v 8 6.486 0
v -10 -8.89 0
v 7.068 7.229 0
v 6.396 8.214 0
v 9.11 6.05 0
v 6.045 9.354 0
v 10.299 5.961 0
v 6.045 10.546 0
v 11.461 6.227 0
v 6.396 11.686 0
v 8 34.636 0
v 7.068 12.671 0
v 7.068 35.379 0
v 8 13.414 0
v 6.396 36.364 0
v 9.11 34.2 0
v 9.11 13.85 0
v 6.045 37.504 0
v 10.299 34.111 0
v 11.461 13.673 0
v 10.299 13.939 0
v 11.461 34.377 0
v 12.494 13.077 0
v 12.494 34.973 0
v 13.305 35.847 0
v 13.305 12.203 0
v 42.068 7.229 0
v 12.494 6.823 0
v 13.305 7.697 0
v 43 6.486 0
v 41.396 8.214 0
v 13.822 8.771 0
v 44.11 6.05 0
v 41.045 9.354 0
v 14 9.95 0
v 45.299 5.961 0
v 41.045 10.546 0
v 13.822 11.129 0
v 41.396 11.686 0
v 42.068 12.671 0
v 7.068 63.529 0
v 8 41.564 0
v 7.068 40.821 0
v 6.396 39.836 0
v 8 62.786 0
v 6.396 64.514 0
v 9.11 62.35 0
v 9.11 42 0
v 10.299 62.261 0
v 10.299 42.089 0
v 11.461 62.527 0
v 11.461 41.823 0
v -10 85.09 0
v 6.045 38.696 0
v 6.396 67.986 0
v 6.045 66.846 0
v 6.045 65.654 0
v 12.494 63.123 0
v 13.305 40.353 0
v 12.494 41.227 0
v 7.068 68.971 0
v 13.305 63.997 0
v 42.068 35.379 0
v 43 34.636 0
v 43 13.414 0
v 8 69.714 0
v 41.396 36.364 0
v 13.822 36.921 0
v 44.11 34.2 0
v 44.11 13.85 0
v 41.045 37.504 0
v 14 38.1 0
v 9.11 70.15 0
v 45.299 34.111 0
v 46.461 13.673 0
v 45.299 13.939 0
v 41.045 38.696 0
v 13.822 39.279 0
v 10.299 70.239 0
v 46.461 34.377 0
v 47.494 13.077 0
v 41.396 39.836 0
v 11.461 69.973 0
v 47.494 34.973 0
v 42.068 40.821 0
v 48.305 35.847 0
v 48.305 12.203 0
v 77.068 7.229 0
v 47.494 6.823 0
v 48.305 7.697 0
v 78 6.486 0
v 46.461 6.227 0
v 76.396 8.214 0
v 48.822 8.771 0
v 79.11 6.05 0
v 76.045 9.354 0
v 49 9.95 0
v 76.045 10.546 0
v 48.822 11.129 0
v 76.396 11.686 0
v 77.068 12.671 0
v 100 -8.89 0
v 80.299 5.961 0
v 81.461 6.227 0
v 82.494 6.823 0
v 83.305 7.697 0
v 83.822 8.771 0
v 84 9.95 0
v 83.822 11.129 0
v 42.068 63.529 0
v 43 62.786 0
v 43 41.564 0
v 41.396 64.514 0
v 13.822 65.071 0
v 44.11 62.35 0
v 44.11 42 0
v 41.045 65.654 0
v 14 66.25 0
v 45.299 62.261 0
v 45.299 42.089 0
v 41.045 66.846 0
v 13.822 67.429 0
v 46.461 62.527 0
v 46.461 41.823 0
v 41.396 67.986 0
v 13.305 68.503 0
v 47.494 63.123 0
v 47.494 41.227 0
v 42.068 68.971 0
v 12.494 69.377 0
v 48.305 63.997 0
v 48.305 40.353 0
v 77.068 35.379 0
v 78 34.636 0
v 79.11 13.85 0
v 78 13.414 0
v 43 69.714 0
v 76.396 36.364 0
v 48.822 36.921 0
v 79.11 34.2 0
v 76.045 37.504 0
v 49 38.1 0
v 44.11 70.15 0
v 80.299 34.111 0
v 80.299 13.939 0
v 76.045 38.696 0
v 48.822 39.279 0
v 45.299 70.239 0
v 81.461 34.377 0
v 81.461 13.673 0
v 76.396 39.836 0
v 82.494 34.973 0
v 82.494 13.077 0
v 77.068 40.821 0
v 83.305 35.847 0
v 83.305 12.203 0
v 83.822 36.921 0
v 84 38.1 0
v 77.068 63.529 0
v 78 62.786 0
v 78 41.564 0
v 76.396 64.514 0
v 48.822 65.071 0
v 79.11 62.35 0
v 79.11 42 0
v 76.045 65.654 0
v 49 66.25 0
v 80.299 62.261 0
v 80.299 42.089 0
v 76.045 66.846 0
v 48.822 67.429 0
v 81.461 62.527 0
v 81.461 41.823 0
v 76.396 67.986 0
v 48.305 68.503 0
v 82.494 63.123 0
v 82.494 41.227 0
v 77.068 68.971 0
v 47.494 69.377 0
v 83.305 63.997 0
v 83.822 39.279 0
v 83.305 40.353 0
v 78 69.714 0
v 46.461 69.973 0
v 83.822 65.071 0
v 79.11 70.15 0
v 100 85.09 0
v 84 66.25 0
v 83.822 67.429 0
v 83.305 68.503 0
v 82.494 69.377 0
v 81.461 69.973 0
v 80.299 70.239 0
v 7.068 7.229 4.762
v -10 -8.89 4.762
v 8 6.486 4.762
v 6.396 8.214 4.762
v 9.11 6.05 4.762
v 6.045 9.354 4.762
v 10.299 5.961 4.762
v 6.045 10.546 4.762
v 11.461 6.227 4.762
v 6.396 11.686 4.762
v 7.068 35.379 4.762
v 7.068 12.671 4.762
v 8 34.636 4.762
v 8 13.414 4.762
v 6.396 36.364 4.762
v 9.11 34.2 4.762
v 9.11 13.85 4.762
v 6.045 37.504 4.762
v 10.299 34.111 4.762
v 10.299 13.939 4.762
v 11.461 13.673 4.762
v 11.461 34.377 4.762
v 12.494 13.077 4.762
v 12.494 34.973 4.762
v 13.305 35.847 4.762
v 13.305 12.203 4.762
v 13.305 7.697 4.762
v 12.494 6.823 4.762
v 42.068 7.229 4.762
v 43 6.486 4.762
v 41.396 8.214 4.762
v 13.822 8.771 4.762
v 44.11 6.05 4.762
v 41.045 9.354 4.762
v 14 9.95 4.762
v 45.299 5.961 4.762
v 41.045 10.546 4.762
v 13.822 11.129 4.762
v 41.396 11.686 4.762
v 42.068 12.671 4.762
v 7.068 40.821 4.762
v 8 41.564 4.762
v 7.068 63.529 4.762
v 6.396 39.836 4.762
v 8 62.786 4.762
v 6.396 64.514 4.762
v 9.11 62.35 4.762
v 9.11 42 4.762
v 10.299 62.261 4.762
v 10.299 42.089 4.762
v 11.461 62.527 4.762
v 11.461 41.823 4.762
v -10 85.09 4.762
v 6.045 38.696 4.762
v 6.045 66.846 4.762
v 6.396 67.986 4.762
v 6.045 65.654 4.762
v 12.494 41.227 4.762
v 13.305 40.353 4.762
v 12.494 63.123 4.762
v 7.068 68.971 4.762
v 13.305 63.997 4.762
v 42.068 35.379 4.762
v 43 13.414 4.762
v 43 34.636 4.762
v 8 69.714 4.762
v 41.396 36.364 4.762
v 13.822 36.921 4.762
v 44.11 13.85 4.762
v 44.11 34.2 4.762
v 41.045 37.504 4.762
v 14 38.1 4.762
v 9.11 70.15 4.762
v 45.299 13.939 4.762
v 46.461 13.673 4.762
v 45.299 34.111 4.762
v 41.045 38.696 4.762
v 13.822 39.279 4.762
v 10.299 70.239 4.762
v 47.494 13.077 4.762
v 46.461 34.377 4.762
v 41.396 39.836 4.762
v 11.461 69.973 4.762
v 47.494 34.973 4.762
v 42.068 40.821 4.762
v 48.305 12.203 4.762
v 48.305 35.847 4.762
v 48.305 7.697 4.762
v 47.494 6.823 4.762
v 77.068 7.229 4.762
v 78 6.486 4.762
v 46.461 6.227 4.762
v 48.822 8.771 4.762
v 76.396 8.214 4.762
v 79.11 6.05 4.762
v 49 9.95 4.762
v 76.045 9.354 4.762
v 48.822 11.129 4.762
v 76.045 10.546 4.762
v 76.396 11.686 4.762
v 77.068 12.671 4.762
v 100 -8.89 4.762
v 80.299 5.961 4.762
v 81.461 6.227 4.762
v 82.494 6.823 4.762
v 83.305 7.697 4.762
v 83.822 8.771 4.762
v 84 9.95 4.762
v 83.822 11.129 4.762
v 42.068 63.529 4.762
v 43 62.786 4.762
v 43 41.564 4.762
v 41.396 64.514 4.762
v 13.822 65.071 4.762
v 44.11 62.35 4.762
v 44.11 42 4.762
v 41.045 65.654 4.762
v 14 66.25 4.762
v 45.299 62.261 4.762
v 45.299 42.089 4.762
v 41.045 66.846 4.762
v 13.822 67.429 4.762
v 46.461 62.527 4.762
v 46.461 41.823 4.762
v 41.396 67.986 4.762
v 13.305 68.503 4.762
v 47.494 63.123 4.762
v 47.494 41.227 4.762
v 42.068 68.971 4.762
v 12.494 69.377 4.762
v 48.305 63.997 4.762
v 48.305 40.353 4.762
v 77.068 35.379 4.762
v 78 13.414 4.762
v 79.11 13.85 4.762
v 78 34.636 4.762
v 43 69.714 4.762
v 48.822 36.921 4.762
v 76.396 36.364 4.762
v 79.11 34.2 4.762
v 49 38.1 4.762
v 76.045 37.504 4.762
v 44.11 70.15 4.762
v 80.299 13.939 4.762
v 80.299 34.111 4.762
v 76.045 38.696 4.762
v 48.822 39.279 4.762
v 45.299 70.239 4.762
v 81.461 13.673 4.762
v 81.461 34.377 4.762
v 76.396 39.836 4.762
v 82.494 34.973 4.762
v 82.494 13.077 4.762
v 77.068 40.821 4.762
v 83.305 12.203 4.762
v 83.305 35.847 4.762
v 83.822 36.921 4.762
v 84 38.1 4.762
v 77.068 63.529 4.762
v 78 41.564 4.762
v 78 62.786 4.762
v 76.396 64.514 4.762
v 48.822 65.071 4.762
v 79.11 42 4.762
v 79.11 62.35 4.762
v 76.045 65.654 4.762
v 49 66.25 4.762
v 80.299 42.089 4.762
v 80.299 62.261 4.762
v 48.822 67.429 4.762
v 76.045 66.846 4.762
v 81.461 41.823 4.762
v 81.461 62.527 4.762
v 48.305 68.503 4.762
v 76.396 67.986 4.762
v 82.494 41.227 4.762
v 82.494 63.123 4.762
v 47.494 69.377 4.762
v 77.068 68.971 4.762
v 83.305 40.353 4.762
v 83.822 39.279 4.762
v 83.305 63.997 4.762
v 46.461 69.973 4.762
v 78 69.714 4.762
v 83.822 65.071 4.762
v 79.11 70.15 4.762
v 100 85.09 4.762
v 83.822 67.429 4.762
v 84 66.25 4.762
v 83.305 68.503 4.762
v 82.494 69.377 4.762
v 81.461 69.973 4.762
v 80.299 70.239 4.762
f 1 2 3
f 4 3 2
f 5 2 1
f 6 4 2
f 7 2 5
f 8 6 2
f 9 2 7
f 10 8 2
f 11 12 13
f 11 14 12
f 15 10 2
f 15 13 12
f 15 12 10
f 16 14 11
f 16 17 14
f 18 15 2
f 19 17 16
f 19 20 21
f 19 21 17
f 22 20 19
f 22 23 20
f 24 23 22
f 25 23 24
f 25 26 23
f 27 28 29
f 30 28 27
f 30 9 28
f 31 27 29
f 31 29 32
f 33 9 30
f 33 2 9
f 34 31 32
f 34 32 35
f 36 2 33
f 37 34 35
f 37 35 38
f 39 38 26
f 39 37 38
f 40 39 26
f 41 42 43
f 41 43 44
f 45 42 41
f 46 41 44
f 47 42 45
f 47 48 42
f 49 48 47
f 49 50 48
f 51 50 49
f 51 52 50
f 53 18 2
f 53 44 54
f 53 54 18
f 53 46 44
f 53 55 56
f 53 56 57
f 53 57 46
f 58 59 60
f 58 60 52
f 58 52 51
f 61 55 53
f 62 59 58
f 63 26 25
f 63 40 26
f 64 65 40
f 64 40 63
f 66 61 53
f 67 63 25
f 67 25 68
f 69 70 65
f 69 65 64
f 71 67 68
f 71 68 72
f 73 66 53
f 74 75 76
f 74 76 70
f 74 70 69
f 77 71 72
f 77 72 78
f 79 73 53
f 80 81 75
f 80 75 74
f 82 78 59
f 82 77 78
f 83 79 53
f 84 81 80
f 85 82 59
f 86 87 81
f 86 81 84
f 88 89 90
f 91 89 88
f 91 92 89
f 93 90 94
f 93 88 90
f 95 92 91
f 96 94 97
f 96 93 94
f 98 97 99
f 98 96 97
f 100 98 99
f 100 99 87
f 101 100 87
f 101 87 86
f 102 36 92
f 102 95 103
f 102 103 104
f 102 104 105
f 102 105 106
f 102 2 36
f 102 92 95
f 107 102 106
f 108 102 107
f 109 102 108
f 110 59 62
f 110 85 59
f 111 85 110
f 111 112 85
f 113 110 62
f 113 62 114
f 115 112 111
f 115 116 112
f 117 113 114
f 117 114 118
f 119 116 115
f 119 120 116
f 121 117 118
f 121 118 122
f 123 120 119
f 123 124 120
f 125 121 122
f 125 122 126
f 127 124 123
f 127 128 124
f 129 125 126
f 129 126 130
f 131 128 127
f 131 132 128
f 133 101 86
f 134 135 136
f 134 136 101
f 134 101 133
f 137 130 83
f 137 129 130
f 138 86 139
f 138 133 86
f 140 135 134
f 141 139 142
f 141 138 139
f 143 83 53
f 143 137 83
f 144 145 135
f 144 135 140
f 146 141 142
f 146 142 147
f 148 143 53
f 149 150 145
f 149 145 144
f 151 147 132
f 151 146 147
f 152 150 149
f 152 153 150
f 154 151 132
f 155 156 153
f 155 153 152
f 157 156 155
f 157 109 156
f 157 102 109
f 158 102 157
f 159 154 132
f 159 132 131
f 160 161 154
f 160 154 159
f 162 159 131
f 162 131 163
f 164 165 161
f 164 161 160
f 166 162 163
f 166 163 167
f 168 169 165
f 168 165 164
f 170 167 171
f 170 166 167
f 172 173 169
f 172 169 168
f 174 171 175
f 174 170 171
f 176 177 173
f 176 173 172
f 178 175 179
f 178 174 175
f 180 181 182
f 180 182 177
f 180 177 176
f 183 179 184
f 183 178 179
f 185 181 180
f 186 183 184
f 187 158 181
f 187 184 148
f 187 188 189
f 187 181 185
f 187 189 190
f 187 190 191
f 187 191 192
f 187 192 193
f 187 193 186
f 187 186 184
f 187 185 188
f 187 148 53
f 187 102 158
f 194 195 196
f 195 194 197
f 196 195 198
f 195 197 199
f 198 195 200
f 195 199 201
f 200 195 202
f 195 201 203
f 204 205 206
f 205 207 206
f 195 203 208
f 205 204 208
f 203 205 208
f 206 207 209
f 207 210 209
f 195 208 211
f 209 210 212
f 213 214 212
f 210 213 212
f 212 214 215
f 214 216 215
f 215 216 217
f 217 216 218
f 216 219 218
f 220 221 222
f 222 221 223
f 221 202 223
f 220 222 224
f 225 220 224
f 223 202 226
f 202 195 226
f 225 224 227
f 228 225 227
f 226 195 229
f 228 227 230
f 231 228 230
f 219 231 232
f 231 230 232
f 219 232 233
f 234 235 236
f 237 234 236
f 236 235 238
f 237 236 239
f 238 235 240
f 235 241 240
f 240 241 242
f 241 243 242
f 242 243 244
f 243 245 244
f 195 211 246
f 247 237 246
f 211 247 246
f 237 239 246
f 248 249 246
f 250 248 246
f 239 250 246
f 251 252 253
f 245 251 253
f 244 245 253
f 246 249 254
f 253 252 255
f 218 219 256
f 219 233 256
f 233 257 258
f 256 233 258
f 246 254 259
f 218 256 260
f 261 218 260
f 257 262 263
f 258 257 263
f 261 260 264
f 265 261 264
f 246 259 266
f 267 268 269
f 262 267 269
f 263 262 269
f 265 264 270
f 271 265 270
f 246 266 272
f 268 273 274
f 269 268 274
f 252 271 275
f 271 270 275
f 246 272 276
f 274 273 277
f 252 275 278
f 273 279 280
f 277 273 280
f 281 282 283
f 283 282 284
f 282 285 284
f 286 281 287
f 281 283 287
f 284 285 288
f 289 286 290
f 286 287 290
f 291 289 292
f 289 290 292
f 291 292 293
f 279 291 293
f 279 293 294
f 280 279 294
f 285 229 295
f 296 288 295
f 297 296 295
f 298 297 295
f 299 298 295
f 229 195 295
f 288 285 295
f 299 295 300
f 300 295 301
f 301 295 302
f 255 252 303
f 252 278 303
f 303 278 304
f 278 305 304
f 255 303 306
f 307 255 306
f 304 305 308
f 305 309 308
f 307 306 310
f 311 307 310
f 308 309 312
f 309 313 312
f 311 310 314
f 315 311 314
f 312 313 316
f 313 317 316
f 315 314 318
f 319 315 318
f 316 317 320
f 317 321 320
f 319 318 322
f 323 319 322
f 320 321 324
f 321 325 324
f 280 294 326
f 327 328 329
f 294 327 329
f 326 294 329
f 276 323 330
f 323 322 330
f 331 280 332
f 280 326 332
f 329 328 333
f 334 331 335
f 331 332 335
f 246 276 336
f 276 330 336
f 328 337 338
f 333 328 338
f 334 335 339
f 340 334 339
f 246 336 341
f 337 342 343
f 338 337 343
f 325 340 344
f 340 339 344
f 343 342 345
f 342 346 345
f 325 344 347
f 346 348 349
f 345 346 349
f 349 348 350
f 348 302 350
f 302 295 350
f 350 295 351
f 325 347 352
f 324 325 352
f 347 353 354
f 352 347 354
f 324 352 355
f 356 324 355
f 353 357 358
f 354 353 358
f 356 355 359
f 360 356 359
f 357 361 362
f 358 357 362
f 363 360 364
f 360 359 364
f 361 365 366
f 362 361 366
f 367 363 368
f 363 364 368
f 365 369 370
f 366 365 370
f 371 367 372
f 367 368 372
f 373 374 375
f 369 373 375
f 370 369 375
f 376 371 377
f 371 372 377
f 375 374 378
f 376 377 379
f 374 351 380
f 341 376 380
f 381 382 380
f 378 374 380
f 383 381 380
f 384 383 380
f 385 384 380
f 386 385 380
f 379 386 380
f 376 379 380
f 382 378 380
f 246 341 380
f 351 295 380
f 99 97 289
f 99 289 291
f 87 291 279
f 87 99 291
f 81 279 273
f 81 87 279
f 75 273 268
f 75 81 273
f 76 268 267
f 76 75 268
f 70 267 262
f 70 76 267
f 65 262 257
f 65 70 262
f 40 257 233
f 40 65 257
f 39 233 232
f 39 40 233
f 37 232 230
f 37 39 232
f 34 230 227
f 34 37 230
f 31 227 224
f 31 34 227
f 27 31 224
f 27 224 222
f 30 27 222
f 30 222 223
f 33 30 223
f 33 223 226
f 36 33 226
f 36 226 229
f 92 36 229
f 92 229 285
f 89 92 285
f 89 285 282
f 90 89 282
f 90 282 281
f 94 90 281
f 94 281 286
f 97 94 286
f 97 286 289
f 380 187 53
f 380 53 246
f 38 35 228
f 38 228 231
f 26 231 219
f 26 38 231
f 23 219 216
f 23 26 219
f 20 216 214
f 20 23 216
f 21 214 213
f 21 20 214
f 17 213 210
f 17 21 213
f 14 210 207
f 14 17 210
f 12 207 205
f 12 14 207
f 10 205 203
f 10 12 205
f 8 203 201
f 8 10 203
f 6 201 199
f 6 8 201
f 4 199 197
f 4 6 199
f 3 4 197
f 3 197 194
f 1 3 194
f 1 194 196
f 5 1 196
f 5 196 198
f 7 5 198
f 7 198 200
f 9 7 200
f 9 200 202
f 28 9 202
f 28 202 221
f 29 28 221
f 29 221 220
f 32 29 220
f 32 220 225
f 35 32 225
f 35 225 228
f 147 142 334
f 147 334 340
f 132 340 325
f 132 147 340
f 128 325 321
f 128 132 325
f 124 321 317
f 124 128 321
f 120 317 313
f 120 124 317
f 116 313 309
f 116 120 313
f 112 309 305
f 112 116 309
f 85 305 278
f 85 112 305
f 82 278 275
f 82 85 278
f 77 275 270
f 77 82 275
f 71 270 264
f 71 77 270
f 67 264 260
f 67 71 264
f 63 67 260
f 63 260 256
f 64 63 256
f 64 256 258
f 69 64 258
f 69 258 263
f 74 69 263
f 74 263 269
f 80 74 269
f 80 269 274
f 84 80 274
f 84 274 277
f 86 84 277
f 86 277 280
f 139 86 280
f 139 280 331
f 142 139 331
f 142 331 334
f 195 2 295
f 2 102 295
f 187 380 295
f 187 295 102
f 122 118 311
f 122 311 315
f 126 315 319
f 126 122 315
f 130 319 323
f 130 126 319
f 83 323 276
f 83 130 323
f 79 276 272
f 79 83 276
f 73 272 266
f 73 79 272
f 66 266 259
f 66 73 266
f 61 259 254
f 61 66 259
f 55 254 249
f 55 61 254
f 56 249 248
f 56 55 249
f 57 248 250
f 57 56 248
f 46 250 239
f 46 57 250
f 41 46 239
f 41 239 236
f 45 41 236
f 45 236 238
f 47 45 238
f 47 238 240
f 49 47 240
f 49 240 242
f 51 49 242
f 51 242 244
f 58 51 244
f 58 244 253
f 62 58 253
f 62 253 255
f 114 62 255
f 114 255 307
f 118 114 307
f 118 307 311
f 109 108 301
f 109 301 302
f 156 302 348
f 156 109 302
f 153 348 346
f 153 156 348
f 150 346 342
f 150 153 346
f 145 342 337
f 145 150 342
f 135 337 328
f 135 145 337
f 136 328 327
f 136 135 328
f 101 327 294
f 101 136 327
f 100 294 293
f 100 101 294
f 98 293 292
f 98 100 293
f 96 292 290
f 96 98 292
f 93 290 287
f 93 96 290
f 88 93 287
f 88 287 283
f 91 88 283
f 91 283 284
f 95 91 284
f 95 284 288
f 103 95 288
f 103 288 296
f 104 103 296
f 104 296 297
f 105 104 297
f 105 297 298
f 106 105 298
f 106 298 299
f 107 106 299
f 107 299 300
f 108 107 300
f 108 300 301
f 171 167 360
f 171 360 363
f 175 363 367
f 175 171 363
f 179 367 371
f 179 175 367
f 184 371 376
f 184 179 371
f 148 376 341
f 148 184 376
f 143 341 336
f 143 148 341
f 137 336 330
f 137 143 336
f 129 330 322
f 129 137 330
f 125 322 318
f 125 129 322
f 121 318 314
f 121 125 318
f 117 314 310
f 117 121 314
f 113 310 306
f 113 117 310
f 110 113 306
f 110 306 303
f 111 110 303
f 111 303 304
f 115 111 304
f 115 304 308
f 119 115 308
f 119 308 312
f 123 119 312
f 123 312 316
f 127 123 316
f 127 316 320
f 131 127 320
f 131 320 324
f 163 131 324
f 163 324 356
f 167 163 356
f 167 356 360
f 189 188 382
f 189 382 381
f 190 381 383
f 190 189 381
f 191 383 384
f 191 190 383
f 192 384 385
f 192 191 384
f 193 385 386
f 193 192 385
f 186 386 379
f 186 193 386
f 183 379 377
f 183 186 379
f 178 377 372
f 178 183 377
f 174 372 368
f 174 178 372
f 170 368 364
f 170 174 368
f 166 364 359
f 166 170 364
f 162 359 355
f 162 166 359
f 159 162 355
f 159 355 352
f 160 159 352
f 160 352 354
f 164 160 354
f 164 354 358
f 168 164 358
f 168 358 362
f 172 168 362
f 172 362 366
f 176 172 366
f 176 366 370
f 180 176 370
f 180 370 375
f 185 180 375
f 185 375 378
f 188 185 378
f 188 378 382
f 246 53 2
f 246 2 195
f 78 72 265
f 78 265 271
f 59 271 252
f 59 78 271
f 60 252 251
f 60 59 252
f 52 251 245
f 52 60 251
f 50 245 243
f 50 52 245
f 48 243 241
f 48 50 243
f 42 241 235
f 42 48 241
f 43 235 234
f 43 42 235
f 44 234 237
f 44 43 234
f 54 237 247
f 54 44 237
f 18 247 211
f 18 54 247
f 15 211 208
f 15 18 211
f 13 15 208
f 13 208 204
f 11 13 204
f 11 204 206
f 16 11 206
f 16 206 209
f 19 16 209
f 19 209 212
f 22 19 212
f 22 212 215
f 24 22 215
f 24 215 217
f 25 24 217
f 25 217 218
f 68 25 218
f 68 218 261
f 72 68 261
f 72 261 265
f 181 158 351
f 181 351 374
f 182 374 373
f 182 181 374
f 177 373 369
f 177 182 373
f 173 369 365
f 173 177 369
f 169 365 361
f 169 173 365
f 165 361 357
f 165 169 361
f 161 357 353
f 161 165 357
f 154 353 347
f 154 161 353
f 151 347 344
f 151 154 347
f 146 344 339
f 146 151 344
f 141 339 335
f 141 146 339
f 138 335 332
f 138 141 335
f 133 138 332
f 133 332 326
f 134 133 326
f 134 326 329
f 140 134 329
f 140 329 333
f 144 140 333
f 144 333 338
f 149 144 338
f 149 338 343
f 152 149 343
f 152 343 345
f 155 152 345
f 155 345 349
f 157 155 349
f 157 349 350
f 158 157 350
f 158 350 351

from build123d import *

# Parameters (mm, degrees)
CROQUIS1_W               = 90
CROQUIS1_H               = 76.2
CROQUIS1_R               = 4
SALIENTE_EXTRUIR1_DEPTH  = 0.47625
CROQUIS1_2_W             = 90
CROQUIS1_2_H             = 76.2
CROQUIS1_2_R             = 4
SALIENTE_EXTRUIR2_DEPTH  = 4.7625
CROQUIS3_W               = 90
CROQUIS3_H               = 4.7625
SALIENTE_EXTRUIR3_DEPTH  = 4.445
CROQUIS5_W               = 90
CROQUIS5_H               = 4.7625
SALIENTE_EXTRUIR4_DEPTH  = 4.445
CROQUIS6_W               = 4.7625
CROQUIS6_H               = 85.09
SALIENTE_EXTRUIR5_DEPTH  = 5
CROQUIS7_W               = 4.7625
CROQUIS7_H               = 85.09
SALIENTE_EXTRUIR6_DEPTH  = 5
CROQUIS8_W               = 100
CROQUIS8_H               = 4.7625
SALIENTE_EXTRUIR7_DEPTH  = 4.445
CROQUIS9_W               = 100
CROQUIS9_H               = 4.7625
SALIENTE_EXTRUIR8_DEPTH  = 4.445
CROQUIS10_W              = 4.7625
CROQUIS10_H              = 93.98
SALIENTE_EXTRUIR9_DEPTH  = 5
CROQUIS12_W              = 4.7625
CROQUIS12_H              = 93.98
SALIENTE_EXTRUIR10_DEPTH = 5


with BuildPart() as part:
    # Croquis1 → Saliente-Extruir1 (new body)
    with BuildSketch(Plane.XY):
        with Locations((45, 38.1)):
            Rectangle(CROQUIS1_W, CROQUIS1_H)
        with Locations((45, 38.1)):
            Circle(CROQUIS1_R, mode=Mode.SUBTRACT)
        with Locations((10, 9.95)):
            Circle(CROQUIS1_R, mode=Mode.SUBTRACT)
        with Locations((10, 66.25)):
            Circle(CROQUIS1_R, mode=Mode.SUBTRACT)
        with Locations((80, 66.25)):
            Circle(CROQUIS1_R, mode=Mode.SUBTRACT)
        with Locations((80, 9.95)):
            Circle(CROQUIS1_R, mode=Mode.SUBTRACT)
        with Locations((45, 66.25)):
            Circle(CROQUIS1_R, mode=Mode.SUBTRACT)
        with Locations((10, 38.1)):
            Circle(CROQUIS1_R, mode=Mode.SUBTRACT)
        with Locations((80, 38.1)):
            Circle(CROQUIS1_R, mode=Mode.SUBTRACT)
        with Locations((45, 9.95)):
            Circle(CROQUIS1_R, mode=Mode.SUBTRACT)
    extrude(amount=SALIENTE_EXTRUIR1_DEPTH)

    # Croquis1<2> → Saliente-Extruir2 (add)
    with BuildSketch(Plane.XY):
        with Locations((45, 38.1)):
            Rectangle(CROQUIS1_2_W, CROQUIS1_2_H)
        with Locations((45, 38.1)):
            Circle(CROQUIS1_2_R, mode=Mode.SUBTRACT)
        with Locations((10, 9.95)):
            Circle(CROQUIS1_2_R, mode=Mode.SUBTRACT)
        with Locations((10, 66.25)):
            Circle(CROQUIS1_2_R, mode=Mode.SUBTRACT)
        with Locations((80, 66.25)):
            Circle(CROQUIS1_2_R, mode=Mode.SUBTRACT)
        with Locations((80, 9.95)):
            Circle(CROQUIS1_2_R, mode=Mode.SUBTRACT)
        with Locations((45, 66.25)):
            Circle(CROQUIS1_2_R, mode=Mode.SUBTRACT)
        with Locations((10, 38.1)):
            Circle(CROQUIS1_2_R, mode=Mode.SUBTRACT)
        with Locations((80, 38.1)):
            Circle(CROQUIS1_2_R, mode=Mode.SUBTRACT)
        with Locations((45, 9.95)):
            Circle(CROQUIS1_2_R, mode=Mode.SUBTRACT)
    extrude(amount=SALIENTE_EXTRUIR2_DEPTH)

    # Croquis3 → Saliente-Extruir3 (add)
    with BuildSketch(Plane.XZ):
        with Locations((45, 2.38125)):
            Rectangle(CROQUIS3_W, CROQUIS3_H)
    extrude(amount=SALIENTE_EXTRUIR3_DEPTH)

    # Croquis5 → Saliente-Extruir4 (add)
    with BuildSketch(Plane(origin=(0, 76.2, 0), x_dir=(1, 0, 0), z_dir=(0, 1, 0))):
        with Locations((45, -2.38125)):
            Rectangle(CROQUIS5_W, CROQUIS5_H)
    extrude(amount=SALIENTE_EXTRUIR4_DEPTH)

    # Croquis6 → Saliente-Extruir5 (add)
    with BuildSketch(Plane.ZY):
        with Locations((2.38125, 38.1)):
            Rectangle(CROQUIS6_W, CROQUIS6_H)
    extrude(amount=SALIENTE_EXTRUIR5_DEPTH)

    # Croquis7 → Saliente-Extruir6 (add)
    with BuildSketch(Plane(origin=(90, 0, 0), x_dir=(0, 0, -1), z_dir=(1, 0, 0))):
        with Locations((-2.38125, 38.1)):
            Rectangle(CROQUIS7_W, CROQUIS7_H)
    extrude(amount=SALIENTE_EXTRUIR6_DEPTH)

    # Croquis8 → Saliente-Extruir7 (add)
    with BuildSketch(Plane.XZ.offset(4.445)):
        with Locations((45, 2.38125)):
            Rectangle(CROQUIS8_W, CROQUIS8_H)
    extrude(amount=SALIENTE_EXTRUIR7_DEPTH)

    # Croquis9 → Saliente-Extruir8 (add)
    with BuildSketch(Plane(origin=(0, 80.645, 0), x_dir=(1, 0, 0), z_dir=(0, 1, 0))):
        with Locations((45, -2.38125)):
            Rectangle(CROQUIS9_W, CROQUIS9_H)
    extrude(amount=SALIENTE_EXTRUIR8_DEPTH)

    # Croquis10 → Saliente-Extruir9 (add)
    with BuildSketch(Plane(origin=(95, 0, 0), x_dir=(0, 0, -1), z_dir=(1, 0, 0))):
        with Locations((-2.38125, 38.1)):
            Rectangle(CROQUIS10_W, CROQUIS10_H)
    extrude(amount=SALIENTE_EXTRUIR9_DEPTH)

    # Croquis12 → Saliente-Extruir10 (add)
    with BuildSketch(Plane.ZY.offset(5)):
        with Locations((2.38125, 38.1)):
            Rectangle(CROQUIS12_W, CROQUIS12_H)
    extrude(amount=SALIENTE_EXTRUIR10_DEPTH)


solid = part.part
